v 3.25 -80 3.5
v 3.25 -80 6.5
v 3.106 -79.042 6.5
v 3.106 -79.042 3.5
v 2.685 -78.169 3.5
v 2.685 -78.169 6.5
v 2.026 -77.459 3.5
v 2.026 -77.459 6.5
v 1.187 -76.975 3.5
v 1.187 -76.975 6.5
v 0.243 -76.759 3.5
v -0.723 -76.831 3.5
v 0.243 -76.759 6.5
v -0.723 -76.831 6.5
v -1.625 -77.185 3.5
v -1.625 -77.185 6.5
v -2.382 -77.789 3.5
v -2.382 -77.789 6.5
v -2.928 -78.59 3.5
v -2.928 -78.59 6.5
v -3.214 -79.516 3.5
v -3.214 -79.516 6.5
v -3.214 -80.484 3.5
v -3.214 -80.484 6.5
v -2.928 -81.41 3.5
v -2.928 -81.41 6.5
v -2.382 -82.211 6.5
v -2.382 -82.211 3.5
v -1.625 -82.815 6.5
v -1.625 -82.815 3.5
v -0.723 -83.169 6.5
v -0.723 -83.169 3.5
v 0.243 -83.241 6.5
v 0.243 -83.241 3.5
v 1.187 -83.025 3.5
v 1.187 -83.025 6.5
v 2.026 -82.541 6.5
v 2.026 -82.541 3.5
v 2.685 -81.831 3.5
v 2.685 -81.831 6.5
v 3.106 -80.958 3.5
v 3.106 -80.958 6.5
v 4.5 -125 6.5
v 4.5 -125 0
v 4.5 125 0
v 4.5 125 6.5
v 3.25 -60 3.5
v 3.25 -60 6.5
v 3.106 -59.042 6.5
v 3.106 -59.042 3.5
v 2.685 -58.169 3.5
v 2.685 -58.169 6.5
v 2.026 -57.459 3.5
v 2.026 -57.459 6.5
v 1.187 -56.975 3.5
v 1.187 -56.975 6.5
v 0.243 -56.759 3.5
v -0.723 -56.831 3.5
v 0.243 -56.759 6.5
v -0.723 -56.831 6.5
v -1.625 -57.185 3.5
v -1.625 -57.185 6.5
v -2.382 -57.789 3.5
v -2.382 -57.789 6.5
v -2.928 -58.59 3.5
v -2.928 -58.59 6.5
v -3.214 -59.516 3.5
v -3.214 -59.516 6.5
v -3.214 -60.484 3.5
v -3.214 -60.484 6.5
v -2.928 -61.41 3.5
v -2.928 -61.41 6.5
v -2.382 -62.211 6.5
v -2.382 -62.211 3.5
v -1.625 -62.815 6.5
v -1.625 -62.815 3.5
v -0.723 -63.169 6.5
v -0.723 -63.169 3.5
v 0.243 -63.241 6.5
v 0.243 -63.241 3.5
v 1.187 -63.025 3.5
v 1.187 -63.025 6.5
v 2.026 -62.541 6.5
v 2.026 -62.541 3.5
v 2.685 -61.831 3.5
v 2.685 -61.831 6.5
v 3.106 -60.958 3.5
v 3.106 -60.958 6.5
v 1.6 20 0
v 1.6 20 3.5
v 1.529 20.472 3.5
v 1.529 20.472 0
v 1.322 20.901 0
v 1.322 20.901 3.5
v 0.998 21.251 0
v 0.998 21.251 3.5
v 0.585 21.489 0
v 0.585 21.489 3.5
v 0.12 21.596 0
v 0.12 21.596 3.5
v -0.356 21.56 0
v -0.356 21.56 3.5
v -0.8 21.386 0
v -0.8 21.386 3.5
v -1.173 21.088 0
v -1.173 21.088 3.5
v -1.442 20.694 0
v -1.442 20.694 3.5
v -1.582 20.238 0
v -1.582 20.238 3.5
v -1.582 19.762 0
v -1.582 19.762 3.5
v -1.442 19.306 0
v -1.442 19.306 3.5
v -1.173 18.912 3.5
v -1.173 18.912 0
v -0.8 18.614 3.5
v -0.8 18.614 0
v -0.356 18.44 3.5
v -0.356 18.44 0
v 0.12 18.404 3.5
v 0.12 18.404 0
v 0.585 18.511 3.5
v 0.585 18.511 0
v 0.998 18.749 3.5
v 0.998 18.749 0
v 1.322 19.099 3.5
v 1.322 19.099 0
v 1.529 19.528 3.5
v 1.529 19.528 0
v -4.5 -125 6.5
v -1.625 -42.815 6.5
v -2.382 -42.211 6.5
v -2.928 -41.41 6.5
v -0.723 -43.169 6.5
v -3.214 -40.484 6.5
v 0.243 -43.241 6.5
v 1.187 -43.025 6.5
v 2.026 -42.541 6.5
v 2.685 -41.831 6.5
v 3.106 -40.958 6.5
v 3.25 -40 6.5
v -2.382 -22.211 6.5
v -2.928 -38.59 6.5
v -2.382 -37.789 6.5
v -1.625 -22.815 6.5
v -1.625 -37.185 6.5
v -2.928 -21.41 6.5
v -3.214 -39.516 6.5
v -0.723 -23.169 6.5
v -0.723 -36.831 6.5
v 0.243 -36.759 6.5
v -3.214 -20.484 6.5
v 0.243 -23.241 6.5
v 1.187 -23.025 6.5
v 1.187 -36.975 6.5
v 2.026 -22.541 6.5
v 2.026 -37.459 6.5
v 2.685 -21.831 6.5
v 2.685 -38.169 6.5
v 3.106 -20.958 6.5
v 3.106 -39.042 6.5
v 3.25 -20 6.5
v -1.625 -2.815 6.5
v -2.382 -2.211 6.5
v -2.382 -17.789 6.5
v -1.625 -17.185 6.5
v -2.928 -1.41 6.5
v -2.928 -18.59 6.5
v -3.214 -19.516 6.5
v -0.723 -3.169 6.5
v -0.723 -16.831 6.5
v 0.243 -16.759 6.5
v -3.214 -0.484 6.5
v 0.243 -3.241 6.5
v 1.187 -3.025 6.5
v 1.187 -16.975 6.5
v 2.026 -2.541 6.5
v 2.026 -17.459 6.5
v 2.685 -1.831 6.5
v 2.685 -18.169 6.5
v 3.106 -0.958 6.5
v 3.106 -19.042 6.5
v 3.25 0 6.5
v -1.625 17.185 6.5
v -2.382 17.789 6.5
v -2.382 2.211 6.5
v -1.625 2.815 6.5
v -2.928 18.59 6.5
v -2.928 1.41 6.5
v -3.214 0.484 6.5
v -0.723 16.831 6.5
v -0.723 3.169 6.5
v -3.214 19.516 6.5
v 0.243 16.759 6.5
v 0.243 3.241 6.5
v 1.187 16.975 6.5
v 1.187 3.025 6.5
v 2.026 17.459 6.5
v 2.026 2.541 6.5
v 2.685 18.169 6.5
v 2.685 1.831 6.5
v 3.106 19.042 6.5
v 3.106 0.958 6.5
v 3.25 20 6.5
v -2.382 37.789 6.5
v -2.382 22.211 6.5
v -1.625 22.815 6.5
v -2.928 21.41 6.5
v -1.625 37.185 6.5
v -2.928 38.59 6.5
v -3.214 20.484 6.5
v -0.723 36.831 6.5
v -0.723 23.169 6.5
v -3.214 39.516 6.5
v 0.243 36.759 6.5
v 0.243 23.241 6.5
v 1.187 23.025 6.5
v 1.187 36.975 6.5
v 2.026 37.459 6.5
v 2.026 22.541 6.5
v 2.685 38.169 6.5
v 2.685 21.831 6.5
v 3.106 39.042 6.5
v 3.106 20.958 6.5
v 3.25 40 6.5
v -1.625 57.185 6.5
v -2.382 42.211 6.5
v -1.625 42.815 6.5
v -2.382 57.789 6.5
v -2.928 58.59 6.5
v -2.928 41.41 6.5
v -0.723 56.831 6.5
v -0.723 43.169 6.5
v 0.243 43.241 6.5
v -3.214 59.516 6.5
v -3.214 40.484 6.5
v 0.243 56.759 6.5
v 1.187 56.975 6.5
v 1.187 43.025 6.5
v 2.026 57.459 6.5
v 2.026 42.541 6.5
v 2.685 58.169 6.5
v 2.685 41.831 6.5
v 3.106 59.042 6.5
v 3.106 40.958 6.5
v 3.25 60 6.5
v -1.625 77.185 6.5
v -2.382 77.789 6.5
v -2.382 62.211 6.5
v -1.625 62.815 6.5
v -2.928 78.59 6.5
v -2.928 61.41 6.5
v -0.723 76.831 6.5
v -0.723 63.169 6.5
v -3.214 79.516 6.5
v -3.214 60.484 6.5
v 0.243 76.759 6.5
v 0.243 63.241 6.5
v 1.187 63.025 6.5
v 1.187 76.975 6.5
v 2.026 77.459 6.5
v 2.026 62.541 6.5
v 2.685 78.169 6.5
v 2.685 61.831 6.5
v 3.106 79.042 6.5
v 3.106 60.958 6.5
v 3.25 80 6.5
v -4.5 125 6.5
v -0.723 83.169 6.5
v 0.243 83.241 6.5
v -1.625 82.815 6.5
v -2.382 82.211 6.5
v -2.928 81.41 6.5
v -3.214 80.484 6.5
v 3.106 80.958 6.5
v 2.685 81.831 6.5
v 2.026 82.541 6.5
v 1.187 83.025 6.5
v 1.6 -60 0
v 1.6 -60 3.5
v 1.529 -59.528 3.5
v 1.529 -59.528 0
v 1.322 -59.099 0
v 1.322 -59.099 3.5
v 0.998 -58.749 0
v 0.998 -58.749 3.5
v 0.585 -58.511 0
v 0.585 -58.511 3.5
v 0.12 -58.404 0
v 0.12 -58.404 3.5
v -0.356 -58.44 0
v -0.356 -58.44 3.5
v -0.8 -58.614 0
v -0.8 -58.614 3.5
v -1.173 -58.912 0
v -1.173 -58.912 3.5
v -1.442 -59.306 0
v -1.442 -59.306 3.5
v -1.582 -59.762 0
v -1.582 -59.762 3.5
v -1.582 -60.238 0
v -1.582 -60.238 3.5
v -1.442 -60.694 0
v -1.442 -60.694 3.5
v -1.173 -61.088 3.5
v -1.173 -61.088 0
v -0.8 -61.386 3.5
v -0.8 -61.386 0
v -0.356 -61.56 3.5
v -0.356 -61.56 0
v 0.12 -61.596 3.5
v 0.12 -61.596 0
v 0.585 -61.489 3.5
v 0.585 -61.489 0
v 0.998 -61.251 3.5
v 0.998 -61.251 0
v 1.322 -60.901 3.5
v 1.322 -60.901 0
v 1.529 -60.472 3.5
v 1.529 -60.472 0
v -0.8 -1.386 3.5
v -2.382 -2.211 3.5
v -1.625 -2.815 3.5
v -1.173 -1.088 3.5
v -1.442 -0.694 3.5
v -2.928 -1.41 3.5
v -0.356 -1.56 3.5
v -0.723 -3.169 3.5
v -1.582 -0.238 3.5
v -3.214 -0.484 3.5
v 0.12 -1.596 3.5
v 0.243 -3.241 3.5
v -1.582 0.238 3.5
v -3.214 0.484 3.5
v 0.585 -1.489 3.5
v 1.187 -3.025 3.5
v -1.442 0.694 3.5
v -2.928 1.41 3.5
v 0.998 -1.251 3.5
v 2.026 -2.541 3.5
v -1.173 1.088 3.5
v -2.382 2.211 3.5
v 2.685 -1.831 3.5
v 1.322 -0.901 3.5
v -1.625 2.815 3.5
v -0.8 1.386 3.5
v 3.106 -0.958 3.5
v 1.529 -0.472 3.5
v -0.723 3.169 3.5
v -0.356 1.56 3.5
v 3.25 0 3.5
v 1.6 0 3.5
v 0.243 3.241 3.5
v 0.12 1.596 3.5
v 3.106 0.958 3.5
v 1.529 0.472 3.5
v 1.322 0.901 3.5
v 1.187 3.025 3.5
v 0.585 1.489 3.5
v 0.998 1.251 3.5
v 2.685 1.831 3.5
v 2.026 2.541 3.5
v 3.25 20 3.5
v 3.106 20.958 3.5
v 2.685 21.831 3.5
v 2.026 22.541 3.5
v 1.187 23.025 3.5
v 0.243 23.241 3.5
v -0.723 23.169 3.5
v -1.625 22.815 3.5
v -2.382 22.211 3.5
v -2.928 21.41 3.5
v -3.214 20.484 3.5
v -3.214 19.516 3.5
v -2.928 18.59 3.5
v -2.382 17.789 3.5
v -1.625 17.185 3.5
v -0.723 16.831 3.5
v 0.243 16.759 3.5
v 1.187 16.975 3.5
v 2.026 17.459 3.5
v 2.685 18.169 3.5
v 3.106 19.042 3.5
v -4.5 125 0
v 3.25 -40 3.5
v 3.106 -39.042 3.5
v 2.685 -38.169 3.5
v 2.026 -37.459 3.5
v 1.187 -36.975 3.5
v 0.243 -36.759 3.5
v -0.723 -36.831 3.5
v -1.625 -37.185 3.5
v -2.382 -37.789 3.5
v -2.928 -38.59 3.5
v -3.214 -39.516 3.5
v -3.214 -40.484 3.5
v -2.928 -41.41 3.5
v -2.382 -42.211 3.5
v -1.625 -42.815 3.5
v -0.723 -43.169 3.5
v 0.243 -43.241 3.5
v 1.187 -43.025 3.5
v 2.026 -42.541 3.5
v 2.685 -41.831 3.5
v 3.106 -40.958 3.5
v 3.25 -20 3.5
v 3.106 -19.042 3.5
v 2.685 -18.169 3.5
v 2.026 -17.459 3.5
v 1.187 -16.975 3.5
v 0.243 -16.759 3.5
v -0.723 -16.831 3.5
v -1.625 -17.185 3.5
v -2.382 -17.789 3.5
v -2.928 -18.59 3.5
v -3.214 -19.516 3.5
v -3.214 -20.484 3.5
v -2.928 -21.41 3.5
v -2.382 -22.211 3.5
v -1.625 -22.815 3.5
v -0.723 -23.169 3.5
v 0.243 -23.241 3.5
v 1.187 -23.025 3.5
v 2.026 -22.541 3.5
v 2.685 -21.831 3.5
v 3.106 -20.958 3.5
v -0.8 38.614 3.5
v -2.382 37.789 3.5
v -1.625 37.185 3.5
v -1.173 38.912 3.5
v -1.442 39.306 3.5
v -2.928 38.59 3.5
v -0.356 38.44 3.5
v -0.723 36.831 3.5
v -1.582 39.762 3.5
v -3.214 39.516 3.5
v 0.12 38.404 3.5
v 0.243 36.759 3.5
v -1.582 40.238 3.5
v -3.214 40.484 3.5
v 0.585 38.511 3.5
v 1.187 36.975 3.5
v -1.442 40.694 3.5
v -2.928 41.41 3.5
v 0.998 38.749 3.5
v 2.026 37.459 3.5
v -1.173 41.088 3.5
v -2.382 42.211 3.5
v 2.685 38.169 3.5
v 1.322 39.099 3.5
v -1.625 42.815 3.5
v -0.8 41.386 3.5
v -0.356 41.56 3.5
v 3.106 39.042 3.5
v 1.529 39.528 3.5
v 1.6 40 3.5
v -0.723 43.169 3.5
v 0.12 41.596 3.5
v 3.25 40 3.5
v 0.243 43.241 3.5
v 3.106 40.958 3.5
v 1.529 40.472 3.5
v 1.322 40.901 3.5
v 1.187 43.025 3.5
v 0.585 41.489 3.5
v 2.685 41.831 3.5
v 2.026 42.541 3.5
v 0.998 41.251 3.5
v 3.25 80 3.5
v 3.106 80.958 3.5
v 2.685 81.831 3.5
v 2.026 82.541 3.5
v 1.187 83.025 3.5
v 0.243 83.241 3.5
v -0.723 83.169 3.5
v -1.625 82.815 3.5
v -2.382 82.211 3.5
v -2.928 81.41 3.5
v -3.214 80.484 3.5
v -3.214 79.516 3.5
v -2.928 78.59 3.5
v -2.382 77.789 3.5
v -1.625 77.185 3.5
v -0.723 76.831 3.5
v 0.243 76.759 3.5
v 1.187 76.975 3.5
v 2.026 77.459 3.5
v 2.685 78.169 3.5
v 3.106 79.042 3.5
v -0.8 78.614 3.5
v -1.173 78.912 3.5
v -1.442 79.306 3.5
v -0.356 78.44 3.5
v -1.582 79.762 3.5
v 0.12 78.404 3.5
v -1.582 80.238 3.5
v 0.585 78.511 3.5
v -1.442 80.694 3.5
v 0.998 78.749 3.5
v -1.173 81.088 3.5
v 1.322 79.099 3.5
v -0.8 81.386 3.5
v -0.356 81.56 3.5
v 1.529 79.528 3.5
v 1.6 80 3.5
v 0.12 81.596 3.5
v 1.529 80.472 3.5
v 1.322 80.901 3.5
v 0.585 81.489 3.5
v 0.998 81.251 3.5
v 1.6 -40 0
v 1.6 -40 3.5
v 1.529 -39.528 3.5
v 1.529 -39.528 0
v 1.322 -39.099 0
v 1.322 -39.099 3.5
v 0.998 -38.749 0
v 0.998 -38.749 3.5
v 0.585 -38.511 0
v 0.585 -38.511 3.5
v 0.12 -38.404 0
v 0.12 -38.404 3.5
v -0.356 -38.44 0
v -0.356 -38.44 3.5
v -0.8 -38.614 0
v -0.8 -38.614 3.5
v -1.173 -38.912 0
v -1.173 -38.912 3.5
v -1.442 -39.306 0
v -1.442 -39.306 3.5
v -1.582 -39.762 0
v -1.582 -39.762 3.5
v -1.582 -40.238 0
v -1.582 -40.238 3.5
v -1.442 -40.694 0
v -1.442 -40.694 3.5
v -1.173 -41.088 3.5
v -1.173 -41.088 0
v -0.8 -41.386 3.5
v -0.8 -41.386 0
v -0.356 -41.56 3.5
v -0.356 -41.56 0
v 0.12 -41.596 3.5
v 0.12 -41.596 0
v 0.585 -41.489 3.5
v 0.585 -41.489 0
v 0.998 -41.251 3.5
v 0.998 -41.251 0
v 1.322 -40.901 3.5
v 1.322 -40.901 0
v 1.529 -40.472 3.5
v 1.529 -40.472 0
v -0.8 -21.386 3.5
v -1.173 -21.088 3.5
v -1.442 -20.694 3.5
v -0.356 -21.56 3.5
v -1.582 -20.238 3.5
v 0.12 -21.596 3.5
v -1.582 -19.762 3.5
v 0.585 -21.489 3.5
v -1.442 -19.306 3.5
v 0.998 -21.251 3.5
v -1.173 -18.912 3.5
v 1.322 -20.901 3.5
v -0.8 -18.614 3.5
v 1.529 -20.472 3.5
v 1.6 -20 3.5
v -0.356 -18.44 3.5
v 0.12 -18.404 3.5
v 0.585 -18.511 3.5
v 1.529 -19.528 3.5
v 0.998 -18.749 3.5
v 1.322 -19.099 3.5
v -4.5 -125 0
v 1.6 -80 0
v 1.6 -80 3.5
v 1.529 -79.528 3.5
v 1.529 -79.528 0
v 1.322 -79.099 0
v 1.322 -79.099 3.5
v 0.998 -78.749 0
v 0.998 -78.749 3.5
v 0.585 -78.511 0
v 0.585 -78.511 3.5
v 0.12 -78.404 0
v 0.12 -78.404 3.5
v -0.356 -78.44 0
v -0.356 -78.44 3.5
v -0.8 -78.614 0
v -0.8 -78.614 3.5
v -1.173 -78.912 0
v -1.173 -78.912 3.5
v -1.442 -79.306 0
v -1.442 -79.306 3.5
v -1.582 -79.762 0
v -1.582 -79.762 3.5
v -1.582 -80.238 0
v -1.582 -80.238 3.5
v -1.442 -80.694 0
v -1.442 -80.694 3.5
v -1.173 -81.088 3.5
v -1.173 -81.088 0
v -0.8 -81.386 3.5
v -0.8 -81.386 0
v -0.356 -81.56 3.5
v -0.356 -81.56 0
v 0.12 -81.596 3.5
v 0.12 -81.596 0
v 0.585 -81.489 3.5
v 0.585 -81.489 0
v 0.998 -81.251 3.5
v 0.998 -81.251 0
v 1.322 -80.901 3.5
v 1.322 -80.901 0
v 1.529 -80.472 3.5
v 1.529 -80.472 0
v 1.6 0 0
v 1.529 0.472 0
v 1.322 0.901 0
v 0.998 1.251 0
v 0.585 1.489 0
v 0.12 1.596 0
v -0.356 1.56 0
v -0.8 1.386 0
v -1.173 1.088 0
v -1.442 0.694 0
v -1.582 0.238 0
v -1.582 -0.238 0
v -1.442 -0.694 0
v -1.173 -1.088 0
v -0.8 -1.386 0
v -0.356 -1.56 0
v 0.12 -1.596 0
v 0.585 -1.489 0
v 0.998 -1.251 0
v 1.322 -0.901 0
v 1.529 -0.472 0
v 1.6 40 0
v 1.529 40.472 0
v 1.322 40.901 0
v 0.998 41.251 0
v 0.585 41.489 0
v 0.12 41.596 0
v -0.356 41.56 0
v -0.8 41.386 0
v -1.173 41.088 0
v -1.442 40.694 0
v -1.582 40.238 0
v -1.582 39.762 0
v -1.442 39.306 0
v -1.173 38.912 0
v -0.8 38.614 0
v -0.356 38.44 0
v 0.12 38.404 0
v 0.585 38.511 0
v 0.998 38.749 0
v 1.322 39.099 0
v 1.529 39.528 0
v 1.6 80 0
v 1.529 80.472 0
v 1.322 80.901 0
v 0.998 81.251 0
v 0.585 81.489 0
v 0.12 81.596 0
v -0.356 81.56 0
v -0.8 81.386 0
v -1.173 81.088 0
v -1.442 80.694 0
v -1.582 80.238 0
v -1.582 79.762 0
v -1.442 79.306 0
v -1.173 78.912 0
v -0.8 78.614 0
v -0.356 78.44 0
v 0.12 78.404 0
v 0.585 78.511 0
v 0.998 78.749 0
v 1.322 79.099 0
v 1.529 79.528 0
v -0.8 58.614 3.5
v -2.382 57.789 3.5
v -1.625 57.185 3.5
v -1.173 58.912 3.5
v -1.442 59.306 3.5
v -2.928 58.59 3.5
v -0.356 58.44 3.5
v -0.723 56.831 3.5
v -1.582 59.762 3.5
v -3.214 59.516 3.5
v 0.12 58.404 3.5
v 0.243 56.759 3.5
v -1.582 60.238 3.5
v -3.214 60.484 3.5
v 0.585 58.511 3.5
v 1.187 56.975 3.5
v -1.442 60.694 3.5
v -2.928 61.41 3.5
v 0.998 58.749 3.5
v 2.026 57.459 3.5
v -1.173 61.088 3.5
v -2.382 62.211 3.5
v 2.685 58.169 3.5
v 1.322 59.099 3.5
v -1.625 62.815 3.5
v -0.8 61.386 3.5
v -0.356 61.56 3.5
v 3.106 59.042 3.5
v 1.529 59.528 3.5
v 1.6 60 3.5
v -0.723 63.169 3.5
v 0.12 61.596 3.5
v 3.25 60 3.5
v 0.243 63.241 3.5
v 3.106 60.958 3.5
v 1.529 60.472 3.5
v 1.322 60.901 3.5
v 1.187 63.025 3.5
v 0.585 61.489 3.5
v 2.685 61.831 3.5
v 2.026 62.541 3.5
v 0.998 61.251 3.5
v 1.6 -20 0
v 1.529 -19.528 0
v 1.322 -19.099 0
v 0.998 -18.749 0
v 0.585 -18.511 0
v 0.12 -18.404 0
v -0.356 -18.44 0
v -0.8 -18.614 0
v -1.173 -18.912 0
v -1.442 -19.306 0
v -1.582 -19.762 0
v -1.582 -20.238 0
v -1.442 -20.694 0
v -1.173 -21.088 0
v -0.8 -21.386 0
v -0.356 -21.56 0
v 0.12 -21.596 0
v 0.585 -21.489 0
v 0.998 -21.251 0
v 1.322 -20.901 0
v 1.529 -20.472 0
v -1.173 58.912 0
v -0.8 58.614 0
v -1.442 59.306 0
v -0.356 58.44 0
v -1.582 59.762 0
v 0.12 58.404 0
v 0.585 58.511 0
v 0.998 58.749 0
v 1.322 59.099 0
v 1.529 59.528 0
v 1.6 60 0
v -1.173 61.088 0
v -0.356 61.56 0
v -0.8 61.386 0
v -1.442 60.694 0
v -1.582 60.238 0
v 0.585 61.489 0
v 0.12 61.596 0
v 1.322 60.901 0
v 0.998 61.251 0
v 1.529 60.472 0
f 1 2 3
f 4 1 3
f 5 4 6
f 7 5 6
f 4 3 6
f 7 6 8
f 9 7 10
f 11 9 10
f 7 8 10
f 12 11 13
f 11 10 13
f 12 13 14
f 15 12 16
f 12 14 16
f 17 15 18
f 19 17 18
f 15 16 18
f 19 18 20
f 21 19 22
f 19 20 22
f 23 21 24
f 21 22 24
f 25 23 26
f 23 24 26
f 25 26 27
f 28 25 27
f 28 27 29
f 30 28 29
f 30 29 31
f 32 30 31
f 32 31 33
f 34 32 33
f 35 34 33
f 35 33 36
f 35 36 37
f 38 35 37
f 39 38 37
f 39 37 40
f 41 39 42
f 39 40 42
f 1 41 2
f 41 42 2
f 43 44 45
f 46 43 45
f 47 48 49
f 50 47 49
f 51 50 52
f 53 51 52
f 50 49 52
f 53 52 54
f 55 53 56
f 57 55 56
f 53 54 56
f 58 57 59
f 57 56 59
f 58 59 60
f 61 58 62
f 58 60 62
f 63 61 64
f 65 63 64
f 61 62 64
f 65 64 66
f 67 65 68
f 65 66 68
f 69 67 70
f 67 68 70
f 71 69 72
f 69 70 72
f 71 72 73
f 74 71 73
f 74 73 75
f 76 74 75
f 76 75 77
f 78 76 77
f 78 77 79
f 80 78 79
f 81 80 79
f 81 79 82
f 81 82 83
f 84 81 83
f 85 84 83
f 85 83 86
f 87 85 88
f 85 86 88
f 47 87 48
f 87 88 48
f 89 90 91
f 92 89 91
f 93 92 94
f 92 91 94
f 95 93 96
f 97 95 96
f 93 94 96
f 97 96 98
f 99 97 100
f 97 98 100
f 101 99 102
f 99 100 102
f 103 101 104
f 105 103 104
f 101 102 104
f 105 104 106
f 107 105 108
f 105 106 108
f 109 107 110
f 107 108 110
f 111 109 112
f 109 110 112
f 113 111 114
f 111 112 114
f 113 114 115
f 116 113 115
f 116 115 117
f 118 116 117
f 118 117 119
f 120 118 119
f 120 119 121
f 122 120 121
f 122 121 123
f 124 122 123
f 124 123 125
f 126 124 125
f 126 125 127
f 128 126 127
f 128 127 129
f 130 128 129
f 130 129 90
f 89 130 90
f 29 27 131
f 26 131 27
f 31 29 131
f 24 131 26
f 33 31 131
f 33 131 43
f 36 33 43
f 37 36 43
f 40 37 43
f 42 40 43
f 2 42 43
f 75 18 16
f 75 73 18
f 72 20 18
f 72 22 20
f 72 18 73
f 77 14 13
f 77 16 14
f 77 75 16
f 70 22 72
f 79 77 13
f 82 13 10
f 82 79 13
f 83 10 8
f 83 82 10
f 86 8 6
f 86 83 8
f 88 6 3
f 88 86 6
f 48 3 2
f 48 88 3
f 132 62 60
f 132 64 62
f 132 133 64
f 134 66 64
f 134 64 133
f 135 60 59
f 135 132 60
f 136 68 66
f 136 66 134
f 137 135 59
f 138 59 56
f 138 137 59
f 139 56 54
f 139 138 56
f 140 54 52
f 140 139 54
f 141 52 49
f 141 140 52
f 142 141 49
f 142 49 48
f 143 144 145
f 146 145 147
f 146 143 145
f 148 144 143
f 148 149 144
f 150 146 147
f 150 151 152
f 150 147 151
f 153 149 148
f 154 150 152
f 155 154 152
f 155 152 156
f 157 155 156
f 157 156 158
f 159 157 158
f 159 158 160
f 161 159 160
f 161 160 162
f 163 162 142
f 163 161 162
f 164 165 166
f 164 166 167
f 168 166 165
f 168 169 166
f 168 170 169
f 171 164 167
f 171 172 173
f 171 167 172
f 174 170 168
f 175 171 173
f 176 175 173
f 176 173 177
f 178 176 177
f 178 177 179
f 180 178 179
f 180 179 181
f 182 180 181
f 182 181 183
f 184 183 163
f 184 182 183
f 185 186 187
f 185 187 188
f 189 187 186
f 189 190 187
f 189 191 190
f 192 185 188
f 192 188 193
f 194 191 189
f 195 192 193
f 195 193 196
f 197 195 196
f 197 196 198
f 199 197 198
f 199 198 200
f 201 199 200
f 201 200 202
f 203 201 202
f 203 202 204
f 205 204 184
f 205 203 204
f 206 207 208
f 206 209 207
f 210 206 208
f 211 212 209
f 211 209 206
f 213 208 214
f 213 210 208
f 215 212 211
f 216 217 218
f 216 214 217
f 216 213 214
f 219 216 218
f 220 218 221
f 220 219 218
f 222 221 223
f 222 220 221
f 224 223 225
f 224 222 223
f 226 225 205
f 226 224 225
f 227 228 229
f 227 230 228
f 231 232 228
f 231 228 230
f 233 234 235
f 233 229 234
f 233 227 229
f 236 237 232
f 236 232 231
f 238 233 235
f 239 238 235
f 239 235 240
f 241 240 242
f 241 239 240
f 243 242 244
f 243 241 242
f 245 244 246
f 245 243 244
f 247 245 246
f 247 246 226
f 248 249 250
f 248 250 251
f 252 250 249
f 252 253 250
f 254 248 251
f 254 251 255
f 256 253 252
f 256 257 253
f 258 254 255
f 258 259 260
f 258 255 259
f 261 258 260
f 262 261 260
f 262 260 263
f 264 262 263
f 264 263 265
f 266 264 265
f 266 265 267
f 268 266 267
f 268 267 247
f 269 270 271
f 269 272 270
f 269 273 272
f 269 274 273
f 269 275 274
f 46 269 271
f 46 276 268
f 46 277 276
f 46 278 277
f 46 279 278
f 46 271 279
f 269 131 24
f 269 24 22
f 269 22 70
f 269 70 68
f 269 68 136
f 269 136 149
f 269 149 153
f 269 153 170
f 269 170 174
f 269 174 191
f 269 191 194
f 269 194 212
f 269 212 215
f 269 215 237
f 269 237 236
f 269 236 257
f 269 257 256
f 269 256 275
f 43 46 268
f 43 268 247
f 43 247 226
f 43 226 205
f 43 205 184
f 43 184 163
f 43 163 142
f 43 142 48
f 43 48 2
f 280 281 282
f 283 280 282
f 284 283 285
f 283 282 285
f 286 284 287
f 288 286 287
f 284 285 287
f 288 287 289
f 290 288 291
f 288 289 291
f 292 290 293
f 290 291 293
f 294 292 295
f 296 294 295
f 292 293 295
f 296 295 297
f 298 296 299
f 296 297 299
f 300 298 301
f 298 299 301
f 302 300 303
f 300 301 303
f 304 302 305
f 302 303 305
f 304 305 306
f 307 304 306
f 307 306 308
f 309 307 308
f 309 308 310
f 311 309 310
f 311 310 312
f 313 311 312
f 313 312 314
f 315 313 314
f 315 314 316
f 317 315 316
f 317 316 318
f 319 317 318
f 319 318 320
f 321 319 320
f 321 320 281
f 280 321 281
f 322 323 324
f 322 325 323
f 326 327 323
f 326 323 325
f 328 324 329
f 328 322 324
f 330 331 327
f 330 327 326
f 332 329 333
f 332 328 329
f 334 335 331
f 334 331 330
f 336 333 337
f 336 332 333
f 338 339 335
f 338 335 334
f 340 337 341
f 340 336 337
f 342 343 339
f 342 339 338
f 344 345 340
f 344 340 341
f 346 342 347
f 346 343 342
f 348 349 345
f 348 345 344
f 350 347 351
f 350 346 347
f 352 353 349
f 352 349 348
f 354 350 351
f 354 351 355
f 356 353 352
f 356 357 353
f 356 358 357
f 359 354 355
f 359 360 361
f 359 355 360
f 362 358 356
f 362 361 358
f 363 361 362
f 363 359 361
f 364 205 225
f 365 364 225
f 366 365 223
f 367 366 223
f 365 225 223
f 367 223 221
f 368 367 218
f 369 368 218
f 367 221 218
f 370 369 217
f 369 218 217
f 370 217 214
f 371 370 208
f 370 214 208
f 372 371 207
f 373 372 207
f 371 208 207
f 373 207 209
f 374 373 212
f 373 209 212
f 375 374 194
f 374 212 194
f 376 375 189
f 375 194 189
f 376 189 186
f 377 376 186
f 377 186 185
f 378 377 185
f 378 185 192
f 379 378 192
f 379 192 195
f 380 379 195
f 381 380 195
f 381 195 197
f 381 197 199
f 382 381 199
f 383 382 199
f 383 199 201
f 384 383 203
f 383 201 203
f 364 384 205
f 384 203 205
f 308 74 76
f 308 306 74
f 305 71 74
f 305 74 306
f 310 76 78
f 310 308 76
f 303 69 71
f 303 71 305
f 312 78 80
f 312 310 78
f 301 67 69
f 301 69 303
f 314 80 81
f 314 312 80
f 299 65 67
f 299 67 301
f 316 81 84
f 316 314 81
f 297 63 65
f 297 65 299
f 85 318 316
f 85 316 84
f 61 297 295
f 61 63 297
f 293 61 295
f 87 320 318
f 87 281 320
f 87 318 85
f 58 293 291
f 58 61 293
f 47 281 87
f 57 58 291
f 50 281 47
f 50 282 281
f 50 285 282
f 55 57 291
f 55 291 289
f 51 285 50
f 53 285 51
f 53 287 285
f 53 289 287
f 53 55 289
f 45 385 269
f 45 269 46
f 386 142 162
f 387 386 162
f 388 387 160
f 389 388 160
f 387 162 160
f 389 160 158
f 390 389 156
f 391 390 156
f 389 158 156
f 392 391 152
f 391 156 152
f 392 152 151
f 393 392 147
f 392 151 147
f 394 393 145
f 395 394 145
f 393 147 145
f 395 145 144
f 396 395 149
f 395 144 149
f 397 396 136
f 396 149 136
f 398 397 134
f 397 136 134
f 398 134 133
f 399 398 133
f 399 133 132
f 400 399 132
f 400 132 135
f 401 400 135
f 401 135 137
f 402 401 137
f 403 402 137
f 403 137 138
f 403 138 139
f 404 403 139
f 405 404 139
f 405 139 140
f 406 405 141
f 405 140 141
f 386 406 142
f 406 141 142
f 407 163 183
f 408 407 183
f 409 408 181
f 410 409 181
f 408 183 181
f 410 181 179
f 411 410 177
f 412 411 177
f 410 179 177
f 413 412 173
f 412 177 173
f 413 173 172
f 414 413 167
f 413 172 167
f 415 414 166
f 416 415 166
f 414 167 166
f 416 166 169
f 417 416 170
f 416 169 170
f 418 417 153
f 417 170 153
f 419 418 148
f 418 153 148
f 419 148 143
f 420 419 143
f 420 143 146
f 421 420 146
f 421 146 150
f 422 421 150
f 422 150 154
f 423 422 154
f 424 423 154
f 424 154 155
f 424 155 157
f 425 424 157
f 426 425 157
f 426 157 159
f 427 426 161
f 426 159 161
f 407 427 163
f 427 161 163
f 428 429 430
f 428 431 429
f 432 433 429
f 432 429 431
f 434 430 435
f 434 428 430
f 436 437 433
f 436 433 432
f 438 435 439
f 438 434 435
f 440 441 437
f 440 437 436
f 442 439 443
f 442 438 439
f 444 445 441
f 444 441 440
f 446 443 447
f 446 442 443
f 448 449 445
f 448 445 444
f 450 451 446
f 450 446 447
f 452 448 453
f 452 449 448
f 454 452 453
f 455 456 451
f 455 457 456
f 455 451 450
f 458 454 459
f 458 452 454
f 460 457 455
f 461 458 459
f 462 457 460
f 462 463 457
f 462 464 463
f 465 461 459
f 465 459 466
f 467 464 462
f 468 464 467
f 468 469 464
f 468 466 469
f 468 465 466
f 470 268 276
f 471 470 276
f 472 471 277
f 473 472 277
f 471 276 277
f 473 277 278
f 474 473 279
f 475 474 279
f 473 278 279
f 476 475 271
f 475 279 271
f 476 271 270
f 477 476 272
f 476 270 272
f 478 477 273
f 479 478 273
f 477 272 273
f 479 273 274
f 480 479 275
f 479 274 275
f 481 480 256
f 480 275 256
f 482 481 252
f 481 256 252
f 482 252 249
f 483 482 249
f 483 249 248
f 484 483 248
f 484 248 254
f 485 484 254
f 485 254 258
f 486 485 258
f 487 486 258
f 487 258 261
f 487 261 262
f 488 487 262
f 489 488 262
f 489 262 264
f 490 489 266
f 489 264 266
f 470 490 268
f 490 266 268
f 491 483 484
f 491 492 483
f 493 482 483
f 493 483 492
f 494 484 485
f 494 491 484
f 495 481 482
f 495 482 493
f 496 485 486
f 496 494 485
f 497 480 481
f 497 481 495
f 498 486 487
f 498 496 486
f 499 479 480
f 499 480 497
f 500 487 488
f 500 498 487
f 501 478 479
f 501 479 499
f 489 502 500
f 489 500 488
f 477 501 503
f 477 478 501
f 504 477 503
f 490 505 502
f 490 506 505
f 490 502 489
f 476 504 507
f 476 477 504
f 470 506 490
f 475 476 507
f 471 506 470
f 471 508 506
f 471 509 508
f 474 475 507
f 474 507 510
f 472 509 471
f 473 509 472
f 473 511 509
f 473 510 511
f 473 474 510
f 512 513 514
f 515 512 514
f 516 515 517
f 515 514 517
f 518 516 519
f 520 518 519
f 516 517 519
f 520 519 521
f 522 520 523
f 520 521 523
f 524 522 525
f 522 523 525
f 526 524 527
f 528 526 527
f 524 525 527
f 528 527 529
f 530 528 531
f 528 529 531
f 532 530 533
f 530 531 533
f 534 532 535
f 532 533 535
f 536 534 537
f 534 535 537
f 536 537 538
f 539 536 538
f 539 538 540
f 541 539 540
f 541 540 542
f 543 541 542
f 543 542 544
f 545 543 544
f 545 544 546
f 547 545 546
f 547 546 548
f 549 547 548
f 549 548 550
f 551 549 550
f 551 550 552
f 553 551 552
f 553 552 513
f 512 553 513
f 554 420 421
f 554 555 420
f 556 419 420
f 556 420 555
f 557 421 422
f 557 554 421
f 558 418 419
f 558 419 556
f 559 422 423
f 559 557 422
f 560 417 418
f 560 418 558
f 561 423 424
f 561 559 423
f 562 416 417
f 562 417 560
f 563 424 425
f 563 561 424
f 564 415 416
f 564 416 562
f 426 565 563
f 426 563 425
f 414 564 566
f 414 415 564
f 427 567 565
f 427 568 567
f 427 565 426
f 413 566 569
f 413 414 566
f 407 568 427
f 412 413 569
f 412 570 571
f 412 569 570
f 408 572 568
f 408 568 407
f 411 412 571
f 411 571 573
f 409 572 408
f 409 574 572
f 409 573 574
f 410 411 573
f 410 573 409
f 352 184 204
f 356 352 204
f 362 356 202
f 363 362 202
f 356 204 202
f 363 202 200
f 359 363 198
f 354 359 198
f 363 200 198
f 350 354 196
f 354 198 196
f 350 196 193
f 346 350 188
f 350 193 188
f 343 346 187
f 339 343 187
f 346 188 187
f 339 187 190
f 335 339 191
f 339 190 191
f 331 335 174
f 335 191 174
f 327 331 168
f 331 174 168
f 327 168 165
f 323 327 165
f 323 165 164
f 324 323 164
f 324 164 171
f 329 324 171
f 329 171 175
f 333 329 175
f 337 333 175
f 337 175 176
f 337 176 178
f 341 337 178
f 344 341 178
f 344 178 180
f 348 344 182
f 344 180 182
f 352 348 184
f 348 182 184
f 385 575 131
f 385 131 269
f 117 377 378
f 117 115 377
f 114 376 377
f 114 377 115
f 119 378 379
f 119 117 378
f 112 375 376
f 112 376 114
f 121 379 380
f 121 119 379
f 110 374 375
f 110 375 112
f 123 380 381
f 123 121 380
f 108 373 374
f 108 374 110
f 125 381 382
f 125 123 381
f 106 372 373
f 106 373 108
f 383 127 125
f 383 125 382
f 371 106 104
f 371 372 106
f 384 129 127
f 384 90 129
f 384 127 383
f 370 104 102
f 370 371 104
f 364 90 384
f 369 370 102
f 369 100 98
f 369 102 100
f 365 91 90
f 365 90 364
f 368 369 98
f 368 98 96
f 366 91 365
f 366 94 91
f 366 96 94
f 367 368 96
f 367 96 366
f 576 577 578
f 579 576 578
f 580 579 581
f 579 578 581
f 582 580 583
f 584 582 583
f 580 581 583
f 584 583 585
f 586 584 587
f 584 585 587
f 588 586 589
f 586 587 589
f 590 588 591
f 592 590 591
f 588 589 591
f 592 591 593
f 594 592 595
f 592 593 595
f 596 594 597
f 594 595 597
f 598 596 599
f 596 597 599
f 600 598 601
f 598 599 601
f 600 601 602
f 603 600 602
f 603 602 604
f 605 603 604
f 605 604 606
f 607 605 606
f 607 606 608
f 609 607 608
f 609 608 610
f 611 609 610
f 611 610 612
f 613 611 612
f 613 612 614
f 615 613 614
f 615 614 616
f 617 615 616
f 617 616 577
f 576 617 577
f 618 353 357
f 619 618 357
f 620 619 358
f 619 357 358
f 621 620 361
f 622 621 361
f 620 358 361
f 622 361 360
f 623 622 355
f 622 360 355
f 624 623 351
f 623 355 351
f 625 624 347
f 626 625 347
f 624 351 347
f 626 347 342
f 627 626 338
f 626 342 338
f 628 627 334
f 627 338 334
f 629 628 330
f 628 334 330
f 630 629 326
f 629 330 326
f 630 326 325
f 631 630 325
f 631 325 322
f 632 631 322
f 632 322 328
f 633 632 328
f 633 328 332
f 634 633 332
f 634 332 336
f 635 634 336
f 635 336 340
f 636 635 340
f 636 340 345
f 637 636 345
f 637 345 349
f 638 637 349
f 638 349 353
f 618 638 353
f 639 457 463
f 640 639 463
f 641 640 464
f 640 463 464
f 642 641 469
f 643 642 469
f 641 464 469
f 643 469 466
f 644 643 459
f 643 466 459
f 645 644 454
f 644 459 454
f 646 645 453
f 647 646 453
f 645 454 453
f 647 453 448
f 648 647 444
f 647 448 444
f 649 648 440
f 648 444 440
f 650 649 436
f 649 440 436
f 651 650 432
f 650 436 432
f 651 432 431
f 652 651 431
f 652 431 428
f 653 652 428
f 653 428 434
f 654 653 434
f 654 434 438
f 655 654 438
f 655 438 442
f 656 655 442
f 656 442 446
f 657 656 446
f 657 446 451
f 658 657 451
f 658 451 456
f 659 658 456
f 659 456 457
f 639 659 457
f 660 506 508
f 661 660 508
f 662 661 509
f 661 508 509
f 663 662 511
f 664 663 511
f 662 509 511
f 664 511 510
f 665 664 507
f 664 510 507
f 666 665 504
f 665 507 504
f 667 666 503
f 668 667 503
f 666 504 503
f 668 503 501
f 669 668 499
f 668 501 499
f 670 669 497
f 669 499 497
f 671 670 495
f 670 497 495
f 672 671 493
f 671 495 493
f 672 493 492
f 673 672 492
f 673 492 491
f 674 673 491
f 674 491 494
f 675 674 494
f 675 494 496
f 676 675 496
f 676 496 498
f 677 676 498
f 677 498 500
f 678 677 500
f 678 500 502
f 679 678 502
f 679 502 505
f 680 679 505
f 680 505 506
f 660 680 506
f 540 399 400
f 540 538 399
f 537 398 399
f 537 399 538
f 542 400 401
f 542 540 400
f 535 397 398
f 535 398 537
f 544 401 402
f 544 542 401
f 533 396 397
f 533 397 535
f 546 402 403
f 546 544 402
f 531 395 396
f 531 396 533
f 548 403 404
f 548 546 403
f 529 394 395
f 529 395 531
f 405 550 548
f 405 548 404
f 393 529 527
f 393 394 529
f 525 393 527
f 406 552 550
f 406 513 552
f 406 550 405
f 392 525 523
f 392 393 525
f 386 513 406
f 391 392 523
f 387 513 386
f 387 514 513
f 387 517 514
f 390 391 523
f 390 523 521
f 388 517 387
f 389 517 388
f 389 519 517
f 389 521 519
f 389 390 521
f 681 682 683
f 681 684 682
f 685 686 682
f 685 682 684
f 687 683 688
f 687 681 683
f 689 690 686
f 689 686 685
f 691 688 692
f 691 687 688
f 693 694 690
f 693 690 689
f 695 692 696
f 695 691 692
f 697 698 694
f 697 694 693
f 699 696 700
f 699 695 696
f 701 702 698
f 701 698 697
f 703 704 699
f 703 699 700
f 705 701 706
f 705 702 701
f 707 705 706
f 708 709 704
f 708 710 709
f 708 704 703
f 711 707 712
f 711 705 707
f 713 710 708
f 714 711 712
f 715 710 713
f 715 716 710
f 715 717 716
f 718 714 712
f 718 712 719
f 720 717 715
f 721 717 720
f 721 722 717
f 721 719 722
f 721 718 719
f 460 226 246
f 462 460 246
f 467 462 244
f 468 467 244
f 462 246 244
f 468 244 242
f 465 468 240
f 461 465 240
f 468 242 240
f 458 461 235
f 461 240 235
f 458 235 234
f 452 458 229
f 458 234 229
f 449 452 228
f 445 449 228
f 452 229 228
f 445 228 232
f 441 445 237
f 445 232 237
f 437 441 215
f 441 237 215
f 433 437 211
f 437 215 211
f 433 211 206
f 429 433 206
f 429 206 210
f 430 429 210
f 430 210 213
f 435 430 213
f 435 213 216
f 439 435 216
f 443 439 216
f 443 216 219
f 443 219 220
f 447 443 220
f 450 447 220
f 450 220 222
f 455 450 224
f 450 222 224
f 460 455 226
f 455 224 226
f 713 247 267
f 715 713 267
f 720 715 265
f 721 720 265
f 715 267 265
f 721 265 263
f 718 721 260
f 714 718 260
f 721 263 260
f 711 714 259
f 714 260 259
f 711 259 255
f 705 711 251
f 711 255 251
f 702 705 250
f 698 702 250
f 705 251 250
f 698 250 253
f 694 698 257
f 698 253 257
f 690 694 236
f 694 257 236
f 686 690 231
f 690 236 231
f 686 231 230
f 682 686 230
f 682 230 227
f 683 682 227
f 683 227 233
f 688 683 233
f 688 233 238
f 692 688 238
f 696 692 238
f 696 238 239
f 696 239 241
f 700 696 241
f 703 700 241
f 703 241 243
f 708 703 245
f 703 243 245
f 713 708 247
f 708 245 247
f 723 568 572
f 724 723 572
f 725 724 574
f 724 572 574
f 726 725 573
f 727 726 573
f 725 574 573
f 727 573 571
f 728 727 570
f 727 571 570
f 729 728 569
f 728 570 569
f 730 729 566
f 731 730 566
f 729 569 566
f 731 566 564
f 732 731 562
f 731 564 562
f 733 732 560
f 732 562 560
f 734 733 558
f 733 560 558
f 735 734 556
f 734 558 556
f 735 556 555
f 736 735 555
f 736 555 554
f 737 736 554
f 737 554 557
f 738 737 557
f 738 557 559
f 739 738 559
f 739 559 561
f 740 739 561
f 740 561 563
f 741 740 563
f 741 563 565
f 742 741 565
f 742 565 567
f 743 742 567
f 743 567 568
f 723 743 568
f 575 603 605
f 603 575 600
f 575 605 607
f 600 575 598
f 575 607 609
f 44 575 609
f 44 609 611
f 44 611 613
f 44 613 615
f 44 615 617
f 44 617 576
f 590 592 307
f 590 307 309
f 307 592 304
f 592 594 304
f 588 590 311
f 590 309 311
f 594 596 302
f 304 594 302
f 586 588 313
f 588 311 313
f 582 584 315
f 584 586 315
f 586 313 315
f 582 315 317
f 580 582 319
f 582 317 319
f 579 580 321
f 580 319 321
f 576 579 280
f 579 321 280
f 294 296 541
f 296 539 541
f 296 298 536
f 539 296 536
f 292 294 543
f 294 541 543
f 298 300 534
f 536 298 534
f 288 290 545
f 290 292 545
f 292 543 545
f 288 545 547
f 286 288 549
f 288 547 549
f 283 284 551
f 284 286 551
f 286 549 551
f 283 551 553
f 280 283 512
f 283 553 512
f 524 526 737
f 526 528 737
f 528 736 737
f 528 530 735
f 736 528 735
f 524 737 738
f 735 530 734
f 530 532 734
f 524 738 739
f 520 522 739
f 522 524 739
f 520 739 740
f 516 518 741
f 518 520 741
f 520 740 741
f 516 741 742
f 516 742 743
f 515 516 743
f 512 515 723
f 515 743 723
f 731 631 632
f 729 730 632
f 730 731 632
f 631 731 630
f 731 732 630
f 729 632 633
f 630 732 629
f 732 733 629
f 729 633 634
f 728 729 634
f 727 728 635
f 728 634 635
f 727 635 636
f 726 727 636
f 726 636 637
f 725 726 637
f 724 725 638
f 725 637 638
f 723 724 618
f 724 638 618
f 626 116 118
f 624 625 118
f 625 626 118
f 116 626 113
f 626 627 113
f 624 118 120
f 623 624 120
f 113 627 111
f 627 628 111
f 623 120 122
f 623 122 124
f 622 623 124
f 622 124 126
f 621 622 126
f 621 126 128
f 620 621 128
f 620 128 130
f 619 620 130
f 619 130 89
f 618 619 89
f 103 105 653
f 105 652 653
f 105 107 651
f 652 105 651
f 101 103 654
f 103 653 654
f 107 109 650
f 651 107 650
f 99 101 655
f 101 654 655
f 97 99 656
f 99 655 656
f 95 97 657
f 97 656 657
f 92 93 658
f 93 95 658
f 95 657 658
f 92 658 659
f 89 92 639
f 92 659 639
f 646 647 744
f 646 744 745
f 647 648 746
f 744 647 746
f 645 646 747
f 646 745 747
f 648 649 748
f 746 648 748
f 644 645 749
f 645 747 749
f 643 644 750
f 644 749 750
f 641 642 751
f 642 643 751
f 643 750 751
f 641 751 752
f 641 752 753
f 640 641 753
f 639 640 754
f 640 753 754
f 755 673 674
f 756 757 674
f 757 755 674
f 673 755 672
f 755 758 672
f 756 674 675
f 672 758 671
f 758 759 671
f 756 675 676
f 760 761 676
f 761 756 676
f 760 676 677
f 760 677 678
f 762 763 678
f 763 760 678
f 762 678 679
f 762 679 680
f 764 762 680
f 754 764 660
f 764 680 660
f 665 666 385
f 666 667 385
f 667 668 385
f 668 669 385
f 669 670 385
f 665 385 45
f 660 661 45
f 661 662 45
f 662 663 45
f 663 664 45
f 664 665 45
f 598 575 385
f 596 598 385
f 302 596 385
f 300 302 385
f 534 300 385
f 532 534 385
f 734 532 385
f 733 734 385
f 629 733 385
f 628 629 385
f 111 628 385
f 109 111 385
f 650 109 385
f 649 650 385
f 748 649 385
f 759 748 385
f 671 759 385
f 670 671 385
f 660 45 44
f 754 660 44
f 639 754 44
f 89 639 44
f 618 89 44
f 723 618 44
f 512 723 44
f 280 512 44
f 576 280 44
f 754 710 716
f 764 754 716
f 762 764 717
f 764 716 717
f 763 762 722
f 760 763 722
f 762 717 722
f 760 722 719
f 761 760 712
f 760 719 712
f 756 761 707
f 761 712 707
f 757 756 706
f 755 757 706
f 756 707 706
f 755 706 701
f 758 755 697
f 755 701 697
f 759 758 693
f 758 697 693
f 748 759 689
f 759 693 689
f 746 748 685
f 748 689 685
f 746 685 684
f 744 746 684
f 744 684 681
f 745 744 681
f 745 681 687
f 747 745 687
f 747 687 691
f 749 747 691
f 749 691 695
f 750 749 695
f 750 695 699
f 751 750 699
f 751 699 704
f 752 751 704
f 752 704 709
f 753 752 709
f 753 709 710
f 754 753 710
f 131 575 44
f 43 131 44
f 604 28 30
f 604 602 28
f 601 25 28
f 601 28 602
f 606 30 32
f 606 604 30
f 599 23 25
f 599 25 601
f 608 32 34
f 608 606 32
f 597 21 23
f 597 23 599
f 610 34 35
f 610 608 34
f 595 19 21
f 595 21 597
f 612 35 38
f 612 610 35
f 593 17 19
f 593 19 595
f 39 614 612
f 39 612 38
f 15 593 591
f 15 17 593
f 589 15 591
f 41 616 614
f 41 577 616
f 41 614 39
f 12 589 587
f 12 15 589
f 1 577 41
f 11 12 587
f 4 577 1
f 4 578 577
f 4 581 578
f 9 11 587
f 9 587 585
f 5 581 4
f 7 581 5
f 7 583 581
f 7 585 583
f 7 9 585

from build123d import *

# Parameters (mm, degrees)
SKETCH_1_W          = 9
SKETCH_1_H          = 250
EXTRUDE_1_DEPTH     = 6.5
SKETCH_2_R          = 1.6
CUT_EXTRUDE_1_DEPTH = 126.249750499
SKETCH_3_R          = 3.25
CUT_EXTRUDE_2_DEPTH = 3


with BuildPart() as part:
    # 草图1 → 凸台-拉伸1 (new body)
    with BuildSketch(Plane.XY):
        Rectangle(SKETCH_1_W, SKETCH_1_H)
    extrude(amount=EXTRUDE_1_DEPTH)

    # 草图2 → 切除-拉伸1 (cut, through all)
    with BuildSketch(Plane.XY.offset(6.5)):
        Circle(SKETCH_2_R)
        with Locations((0, 20)):
            Circle(SKETCH_2_R)
        with Locations((0, 40)):
            Circle(SKETCH_2_R)
        with Locations((0, 60)):
            Circle(SKETCH_2_R)
        with Locations((0, 80)):
            Circle(SKETCH_2_R)
        with Locations((0, -20)):
            Circle(SKETCH_2_R)
        with Locations((0, -40)):
            Circle(SKETCH_2_R)
        with Locations((0, -60)):
            Circle(SKETCH_2_R)
        with Locations((0, -80)):
            Circle(SKETCH_2_R)
    extrude(amount=-CUT_EXTRUDE_1_DEPTH, mode=Mode.SUBTRACT)

    # 草图3 → 切除-拉伸2 (cut)
    with BuildSketch(Plane.XY.offset(6.5)):
        with Locations((0, 80)):
            Circle(SKETCH_3_R)
        with Locations((0, 60)):
            Circle(SKETCH_3_R)
        with Locations((0, 40)):
            Circle(SKETCH_3_R)
        with Locations((0, 20)):
            Circle(SKETCH_3_R)
        Circle(SKETCH_3_R)
        with Locations((0, -20)):
            Circle(SKETCH_3_R)
        with Locations((0, -40)):
            Circle(SKETCH_3_R)
        with Locations((0, -60)):
            Circle(SKETCH_3_R)
        with Locations((0, -80)):
            Circle(SKETCH_3_R)
    extrude(amount=-CUT_EXTRUDE_2_DEPTH, mode=Mode.SUBTRACT)


solid = part.part
